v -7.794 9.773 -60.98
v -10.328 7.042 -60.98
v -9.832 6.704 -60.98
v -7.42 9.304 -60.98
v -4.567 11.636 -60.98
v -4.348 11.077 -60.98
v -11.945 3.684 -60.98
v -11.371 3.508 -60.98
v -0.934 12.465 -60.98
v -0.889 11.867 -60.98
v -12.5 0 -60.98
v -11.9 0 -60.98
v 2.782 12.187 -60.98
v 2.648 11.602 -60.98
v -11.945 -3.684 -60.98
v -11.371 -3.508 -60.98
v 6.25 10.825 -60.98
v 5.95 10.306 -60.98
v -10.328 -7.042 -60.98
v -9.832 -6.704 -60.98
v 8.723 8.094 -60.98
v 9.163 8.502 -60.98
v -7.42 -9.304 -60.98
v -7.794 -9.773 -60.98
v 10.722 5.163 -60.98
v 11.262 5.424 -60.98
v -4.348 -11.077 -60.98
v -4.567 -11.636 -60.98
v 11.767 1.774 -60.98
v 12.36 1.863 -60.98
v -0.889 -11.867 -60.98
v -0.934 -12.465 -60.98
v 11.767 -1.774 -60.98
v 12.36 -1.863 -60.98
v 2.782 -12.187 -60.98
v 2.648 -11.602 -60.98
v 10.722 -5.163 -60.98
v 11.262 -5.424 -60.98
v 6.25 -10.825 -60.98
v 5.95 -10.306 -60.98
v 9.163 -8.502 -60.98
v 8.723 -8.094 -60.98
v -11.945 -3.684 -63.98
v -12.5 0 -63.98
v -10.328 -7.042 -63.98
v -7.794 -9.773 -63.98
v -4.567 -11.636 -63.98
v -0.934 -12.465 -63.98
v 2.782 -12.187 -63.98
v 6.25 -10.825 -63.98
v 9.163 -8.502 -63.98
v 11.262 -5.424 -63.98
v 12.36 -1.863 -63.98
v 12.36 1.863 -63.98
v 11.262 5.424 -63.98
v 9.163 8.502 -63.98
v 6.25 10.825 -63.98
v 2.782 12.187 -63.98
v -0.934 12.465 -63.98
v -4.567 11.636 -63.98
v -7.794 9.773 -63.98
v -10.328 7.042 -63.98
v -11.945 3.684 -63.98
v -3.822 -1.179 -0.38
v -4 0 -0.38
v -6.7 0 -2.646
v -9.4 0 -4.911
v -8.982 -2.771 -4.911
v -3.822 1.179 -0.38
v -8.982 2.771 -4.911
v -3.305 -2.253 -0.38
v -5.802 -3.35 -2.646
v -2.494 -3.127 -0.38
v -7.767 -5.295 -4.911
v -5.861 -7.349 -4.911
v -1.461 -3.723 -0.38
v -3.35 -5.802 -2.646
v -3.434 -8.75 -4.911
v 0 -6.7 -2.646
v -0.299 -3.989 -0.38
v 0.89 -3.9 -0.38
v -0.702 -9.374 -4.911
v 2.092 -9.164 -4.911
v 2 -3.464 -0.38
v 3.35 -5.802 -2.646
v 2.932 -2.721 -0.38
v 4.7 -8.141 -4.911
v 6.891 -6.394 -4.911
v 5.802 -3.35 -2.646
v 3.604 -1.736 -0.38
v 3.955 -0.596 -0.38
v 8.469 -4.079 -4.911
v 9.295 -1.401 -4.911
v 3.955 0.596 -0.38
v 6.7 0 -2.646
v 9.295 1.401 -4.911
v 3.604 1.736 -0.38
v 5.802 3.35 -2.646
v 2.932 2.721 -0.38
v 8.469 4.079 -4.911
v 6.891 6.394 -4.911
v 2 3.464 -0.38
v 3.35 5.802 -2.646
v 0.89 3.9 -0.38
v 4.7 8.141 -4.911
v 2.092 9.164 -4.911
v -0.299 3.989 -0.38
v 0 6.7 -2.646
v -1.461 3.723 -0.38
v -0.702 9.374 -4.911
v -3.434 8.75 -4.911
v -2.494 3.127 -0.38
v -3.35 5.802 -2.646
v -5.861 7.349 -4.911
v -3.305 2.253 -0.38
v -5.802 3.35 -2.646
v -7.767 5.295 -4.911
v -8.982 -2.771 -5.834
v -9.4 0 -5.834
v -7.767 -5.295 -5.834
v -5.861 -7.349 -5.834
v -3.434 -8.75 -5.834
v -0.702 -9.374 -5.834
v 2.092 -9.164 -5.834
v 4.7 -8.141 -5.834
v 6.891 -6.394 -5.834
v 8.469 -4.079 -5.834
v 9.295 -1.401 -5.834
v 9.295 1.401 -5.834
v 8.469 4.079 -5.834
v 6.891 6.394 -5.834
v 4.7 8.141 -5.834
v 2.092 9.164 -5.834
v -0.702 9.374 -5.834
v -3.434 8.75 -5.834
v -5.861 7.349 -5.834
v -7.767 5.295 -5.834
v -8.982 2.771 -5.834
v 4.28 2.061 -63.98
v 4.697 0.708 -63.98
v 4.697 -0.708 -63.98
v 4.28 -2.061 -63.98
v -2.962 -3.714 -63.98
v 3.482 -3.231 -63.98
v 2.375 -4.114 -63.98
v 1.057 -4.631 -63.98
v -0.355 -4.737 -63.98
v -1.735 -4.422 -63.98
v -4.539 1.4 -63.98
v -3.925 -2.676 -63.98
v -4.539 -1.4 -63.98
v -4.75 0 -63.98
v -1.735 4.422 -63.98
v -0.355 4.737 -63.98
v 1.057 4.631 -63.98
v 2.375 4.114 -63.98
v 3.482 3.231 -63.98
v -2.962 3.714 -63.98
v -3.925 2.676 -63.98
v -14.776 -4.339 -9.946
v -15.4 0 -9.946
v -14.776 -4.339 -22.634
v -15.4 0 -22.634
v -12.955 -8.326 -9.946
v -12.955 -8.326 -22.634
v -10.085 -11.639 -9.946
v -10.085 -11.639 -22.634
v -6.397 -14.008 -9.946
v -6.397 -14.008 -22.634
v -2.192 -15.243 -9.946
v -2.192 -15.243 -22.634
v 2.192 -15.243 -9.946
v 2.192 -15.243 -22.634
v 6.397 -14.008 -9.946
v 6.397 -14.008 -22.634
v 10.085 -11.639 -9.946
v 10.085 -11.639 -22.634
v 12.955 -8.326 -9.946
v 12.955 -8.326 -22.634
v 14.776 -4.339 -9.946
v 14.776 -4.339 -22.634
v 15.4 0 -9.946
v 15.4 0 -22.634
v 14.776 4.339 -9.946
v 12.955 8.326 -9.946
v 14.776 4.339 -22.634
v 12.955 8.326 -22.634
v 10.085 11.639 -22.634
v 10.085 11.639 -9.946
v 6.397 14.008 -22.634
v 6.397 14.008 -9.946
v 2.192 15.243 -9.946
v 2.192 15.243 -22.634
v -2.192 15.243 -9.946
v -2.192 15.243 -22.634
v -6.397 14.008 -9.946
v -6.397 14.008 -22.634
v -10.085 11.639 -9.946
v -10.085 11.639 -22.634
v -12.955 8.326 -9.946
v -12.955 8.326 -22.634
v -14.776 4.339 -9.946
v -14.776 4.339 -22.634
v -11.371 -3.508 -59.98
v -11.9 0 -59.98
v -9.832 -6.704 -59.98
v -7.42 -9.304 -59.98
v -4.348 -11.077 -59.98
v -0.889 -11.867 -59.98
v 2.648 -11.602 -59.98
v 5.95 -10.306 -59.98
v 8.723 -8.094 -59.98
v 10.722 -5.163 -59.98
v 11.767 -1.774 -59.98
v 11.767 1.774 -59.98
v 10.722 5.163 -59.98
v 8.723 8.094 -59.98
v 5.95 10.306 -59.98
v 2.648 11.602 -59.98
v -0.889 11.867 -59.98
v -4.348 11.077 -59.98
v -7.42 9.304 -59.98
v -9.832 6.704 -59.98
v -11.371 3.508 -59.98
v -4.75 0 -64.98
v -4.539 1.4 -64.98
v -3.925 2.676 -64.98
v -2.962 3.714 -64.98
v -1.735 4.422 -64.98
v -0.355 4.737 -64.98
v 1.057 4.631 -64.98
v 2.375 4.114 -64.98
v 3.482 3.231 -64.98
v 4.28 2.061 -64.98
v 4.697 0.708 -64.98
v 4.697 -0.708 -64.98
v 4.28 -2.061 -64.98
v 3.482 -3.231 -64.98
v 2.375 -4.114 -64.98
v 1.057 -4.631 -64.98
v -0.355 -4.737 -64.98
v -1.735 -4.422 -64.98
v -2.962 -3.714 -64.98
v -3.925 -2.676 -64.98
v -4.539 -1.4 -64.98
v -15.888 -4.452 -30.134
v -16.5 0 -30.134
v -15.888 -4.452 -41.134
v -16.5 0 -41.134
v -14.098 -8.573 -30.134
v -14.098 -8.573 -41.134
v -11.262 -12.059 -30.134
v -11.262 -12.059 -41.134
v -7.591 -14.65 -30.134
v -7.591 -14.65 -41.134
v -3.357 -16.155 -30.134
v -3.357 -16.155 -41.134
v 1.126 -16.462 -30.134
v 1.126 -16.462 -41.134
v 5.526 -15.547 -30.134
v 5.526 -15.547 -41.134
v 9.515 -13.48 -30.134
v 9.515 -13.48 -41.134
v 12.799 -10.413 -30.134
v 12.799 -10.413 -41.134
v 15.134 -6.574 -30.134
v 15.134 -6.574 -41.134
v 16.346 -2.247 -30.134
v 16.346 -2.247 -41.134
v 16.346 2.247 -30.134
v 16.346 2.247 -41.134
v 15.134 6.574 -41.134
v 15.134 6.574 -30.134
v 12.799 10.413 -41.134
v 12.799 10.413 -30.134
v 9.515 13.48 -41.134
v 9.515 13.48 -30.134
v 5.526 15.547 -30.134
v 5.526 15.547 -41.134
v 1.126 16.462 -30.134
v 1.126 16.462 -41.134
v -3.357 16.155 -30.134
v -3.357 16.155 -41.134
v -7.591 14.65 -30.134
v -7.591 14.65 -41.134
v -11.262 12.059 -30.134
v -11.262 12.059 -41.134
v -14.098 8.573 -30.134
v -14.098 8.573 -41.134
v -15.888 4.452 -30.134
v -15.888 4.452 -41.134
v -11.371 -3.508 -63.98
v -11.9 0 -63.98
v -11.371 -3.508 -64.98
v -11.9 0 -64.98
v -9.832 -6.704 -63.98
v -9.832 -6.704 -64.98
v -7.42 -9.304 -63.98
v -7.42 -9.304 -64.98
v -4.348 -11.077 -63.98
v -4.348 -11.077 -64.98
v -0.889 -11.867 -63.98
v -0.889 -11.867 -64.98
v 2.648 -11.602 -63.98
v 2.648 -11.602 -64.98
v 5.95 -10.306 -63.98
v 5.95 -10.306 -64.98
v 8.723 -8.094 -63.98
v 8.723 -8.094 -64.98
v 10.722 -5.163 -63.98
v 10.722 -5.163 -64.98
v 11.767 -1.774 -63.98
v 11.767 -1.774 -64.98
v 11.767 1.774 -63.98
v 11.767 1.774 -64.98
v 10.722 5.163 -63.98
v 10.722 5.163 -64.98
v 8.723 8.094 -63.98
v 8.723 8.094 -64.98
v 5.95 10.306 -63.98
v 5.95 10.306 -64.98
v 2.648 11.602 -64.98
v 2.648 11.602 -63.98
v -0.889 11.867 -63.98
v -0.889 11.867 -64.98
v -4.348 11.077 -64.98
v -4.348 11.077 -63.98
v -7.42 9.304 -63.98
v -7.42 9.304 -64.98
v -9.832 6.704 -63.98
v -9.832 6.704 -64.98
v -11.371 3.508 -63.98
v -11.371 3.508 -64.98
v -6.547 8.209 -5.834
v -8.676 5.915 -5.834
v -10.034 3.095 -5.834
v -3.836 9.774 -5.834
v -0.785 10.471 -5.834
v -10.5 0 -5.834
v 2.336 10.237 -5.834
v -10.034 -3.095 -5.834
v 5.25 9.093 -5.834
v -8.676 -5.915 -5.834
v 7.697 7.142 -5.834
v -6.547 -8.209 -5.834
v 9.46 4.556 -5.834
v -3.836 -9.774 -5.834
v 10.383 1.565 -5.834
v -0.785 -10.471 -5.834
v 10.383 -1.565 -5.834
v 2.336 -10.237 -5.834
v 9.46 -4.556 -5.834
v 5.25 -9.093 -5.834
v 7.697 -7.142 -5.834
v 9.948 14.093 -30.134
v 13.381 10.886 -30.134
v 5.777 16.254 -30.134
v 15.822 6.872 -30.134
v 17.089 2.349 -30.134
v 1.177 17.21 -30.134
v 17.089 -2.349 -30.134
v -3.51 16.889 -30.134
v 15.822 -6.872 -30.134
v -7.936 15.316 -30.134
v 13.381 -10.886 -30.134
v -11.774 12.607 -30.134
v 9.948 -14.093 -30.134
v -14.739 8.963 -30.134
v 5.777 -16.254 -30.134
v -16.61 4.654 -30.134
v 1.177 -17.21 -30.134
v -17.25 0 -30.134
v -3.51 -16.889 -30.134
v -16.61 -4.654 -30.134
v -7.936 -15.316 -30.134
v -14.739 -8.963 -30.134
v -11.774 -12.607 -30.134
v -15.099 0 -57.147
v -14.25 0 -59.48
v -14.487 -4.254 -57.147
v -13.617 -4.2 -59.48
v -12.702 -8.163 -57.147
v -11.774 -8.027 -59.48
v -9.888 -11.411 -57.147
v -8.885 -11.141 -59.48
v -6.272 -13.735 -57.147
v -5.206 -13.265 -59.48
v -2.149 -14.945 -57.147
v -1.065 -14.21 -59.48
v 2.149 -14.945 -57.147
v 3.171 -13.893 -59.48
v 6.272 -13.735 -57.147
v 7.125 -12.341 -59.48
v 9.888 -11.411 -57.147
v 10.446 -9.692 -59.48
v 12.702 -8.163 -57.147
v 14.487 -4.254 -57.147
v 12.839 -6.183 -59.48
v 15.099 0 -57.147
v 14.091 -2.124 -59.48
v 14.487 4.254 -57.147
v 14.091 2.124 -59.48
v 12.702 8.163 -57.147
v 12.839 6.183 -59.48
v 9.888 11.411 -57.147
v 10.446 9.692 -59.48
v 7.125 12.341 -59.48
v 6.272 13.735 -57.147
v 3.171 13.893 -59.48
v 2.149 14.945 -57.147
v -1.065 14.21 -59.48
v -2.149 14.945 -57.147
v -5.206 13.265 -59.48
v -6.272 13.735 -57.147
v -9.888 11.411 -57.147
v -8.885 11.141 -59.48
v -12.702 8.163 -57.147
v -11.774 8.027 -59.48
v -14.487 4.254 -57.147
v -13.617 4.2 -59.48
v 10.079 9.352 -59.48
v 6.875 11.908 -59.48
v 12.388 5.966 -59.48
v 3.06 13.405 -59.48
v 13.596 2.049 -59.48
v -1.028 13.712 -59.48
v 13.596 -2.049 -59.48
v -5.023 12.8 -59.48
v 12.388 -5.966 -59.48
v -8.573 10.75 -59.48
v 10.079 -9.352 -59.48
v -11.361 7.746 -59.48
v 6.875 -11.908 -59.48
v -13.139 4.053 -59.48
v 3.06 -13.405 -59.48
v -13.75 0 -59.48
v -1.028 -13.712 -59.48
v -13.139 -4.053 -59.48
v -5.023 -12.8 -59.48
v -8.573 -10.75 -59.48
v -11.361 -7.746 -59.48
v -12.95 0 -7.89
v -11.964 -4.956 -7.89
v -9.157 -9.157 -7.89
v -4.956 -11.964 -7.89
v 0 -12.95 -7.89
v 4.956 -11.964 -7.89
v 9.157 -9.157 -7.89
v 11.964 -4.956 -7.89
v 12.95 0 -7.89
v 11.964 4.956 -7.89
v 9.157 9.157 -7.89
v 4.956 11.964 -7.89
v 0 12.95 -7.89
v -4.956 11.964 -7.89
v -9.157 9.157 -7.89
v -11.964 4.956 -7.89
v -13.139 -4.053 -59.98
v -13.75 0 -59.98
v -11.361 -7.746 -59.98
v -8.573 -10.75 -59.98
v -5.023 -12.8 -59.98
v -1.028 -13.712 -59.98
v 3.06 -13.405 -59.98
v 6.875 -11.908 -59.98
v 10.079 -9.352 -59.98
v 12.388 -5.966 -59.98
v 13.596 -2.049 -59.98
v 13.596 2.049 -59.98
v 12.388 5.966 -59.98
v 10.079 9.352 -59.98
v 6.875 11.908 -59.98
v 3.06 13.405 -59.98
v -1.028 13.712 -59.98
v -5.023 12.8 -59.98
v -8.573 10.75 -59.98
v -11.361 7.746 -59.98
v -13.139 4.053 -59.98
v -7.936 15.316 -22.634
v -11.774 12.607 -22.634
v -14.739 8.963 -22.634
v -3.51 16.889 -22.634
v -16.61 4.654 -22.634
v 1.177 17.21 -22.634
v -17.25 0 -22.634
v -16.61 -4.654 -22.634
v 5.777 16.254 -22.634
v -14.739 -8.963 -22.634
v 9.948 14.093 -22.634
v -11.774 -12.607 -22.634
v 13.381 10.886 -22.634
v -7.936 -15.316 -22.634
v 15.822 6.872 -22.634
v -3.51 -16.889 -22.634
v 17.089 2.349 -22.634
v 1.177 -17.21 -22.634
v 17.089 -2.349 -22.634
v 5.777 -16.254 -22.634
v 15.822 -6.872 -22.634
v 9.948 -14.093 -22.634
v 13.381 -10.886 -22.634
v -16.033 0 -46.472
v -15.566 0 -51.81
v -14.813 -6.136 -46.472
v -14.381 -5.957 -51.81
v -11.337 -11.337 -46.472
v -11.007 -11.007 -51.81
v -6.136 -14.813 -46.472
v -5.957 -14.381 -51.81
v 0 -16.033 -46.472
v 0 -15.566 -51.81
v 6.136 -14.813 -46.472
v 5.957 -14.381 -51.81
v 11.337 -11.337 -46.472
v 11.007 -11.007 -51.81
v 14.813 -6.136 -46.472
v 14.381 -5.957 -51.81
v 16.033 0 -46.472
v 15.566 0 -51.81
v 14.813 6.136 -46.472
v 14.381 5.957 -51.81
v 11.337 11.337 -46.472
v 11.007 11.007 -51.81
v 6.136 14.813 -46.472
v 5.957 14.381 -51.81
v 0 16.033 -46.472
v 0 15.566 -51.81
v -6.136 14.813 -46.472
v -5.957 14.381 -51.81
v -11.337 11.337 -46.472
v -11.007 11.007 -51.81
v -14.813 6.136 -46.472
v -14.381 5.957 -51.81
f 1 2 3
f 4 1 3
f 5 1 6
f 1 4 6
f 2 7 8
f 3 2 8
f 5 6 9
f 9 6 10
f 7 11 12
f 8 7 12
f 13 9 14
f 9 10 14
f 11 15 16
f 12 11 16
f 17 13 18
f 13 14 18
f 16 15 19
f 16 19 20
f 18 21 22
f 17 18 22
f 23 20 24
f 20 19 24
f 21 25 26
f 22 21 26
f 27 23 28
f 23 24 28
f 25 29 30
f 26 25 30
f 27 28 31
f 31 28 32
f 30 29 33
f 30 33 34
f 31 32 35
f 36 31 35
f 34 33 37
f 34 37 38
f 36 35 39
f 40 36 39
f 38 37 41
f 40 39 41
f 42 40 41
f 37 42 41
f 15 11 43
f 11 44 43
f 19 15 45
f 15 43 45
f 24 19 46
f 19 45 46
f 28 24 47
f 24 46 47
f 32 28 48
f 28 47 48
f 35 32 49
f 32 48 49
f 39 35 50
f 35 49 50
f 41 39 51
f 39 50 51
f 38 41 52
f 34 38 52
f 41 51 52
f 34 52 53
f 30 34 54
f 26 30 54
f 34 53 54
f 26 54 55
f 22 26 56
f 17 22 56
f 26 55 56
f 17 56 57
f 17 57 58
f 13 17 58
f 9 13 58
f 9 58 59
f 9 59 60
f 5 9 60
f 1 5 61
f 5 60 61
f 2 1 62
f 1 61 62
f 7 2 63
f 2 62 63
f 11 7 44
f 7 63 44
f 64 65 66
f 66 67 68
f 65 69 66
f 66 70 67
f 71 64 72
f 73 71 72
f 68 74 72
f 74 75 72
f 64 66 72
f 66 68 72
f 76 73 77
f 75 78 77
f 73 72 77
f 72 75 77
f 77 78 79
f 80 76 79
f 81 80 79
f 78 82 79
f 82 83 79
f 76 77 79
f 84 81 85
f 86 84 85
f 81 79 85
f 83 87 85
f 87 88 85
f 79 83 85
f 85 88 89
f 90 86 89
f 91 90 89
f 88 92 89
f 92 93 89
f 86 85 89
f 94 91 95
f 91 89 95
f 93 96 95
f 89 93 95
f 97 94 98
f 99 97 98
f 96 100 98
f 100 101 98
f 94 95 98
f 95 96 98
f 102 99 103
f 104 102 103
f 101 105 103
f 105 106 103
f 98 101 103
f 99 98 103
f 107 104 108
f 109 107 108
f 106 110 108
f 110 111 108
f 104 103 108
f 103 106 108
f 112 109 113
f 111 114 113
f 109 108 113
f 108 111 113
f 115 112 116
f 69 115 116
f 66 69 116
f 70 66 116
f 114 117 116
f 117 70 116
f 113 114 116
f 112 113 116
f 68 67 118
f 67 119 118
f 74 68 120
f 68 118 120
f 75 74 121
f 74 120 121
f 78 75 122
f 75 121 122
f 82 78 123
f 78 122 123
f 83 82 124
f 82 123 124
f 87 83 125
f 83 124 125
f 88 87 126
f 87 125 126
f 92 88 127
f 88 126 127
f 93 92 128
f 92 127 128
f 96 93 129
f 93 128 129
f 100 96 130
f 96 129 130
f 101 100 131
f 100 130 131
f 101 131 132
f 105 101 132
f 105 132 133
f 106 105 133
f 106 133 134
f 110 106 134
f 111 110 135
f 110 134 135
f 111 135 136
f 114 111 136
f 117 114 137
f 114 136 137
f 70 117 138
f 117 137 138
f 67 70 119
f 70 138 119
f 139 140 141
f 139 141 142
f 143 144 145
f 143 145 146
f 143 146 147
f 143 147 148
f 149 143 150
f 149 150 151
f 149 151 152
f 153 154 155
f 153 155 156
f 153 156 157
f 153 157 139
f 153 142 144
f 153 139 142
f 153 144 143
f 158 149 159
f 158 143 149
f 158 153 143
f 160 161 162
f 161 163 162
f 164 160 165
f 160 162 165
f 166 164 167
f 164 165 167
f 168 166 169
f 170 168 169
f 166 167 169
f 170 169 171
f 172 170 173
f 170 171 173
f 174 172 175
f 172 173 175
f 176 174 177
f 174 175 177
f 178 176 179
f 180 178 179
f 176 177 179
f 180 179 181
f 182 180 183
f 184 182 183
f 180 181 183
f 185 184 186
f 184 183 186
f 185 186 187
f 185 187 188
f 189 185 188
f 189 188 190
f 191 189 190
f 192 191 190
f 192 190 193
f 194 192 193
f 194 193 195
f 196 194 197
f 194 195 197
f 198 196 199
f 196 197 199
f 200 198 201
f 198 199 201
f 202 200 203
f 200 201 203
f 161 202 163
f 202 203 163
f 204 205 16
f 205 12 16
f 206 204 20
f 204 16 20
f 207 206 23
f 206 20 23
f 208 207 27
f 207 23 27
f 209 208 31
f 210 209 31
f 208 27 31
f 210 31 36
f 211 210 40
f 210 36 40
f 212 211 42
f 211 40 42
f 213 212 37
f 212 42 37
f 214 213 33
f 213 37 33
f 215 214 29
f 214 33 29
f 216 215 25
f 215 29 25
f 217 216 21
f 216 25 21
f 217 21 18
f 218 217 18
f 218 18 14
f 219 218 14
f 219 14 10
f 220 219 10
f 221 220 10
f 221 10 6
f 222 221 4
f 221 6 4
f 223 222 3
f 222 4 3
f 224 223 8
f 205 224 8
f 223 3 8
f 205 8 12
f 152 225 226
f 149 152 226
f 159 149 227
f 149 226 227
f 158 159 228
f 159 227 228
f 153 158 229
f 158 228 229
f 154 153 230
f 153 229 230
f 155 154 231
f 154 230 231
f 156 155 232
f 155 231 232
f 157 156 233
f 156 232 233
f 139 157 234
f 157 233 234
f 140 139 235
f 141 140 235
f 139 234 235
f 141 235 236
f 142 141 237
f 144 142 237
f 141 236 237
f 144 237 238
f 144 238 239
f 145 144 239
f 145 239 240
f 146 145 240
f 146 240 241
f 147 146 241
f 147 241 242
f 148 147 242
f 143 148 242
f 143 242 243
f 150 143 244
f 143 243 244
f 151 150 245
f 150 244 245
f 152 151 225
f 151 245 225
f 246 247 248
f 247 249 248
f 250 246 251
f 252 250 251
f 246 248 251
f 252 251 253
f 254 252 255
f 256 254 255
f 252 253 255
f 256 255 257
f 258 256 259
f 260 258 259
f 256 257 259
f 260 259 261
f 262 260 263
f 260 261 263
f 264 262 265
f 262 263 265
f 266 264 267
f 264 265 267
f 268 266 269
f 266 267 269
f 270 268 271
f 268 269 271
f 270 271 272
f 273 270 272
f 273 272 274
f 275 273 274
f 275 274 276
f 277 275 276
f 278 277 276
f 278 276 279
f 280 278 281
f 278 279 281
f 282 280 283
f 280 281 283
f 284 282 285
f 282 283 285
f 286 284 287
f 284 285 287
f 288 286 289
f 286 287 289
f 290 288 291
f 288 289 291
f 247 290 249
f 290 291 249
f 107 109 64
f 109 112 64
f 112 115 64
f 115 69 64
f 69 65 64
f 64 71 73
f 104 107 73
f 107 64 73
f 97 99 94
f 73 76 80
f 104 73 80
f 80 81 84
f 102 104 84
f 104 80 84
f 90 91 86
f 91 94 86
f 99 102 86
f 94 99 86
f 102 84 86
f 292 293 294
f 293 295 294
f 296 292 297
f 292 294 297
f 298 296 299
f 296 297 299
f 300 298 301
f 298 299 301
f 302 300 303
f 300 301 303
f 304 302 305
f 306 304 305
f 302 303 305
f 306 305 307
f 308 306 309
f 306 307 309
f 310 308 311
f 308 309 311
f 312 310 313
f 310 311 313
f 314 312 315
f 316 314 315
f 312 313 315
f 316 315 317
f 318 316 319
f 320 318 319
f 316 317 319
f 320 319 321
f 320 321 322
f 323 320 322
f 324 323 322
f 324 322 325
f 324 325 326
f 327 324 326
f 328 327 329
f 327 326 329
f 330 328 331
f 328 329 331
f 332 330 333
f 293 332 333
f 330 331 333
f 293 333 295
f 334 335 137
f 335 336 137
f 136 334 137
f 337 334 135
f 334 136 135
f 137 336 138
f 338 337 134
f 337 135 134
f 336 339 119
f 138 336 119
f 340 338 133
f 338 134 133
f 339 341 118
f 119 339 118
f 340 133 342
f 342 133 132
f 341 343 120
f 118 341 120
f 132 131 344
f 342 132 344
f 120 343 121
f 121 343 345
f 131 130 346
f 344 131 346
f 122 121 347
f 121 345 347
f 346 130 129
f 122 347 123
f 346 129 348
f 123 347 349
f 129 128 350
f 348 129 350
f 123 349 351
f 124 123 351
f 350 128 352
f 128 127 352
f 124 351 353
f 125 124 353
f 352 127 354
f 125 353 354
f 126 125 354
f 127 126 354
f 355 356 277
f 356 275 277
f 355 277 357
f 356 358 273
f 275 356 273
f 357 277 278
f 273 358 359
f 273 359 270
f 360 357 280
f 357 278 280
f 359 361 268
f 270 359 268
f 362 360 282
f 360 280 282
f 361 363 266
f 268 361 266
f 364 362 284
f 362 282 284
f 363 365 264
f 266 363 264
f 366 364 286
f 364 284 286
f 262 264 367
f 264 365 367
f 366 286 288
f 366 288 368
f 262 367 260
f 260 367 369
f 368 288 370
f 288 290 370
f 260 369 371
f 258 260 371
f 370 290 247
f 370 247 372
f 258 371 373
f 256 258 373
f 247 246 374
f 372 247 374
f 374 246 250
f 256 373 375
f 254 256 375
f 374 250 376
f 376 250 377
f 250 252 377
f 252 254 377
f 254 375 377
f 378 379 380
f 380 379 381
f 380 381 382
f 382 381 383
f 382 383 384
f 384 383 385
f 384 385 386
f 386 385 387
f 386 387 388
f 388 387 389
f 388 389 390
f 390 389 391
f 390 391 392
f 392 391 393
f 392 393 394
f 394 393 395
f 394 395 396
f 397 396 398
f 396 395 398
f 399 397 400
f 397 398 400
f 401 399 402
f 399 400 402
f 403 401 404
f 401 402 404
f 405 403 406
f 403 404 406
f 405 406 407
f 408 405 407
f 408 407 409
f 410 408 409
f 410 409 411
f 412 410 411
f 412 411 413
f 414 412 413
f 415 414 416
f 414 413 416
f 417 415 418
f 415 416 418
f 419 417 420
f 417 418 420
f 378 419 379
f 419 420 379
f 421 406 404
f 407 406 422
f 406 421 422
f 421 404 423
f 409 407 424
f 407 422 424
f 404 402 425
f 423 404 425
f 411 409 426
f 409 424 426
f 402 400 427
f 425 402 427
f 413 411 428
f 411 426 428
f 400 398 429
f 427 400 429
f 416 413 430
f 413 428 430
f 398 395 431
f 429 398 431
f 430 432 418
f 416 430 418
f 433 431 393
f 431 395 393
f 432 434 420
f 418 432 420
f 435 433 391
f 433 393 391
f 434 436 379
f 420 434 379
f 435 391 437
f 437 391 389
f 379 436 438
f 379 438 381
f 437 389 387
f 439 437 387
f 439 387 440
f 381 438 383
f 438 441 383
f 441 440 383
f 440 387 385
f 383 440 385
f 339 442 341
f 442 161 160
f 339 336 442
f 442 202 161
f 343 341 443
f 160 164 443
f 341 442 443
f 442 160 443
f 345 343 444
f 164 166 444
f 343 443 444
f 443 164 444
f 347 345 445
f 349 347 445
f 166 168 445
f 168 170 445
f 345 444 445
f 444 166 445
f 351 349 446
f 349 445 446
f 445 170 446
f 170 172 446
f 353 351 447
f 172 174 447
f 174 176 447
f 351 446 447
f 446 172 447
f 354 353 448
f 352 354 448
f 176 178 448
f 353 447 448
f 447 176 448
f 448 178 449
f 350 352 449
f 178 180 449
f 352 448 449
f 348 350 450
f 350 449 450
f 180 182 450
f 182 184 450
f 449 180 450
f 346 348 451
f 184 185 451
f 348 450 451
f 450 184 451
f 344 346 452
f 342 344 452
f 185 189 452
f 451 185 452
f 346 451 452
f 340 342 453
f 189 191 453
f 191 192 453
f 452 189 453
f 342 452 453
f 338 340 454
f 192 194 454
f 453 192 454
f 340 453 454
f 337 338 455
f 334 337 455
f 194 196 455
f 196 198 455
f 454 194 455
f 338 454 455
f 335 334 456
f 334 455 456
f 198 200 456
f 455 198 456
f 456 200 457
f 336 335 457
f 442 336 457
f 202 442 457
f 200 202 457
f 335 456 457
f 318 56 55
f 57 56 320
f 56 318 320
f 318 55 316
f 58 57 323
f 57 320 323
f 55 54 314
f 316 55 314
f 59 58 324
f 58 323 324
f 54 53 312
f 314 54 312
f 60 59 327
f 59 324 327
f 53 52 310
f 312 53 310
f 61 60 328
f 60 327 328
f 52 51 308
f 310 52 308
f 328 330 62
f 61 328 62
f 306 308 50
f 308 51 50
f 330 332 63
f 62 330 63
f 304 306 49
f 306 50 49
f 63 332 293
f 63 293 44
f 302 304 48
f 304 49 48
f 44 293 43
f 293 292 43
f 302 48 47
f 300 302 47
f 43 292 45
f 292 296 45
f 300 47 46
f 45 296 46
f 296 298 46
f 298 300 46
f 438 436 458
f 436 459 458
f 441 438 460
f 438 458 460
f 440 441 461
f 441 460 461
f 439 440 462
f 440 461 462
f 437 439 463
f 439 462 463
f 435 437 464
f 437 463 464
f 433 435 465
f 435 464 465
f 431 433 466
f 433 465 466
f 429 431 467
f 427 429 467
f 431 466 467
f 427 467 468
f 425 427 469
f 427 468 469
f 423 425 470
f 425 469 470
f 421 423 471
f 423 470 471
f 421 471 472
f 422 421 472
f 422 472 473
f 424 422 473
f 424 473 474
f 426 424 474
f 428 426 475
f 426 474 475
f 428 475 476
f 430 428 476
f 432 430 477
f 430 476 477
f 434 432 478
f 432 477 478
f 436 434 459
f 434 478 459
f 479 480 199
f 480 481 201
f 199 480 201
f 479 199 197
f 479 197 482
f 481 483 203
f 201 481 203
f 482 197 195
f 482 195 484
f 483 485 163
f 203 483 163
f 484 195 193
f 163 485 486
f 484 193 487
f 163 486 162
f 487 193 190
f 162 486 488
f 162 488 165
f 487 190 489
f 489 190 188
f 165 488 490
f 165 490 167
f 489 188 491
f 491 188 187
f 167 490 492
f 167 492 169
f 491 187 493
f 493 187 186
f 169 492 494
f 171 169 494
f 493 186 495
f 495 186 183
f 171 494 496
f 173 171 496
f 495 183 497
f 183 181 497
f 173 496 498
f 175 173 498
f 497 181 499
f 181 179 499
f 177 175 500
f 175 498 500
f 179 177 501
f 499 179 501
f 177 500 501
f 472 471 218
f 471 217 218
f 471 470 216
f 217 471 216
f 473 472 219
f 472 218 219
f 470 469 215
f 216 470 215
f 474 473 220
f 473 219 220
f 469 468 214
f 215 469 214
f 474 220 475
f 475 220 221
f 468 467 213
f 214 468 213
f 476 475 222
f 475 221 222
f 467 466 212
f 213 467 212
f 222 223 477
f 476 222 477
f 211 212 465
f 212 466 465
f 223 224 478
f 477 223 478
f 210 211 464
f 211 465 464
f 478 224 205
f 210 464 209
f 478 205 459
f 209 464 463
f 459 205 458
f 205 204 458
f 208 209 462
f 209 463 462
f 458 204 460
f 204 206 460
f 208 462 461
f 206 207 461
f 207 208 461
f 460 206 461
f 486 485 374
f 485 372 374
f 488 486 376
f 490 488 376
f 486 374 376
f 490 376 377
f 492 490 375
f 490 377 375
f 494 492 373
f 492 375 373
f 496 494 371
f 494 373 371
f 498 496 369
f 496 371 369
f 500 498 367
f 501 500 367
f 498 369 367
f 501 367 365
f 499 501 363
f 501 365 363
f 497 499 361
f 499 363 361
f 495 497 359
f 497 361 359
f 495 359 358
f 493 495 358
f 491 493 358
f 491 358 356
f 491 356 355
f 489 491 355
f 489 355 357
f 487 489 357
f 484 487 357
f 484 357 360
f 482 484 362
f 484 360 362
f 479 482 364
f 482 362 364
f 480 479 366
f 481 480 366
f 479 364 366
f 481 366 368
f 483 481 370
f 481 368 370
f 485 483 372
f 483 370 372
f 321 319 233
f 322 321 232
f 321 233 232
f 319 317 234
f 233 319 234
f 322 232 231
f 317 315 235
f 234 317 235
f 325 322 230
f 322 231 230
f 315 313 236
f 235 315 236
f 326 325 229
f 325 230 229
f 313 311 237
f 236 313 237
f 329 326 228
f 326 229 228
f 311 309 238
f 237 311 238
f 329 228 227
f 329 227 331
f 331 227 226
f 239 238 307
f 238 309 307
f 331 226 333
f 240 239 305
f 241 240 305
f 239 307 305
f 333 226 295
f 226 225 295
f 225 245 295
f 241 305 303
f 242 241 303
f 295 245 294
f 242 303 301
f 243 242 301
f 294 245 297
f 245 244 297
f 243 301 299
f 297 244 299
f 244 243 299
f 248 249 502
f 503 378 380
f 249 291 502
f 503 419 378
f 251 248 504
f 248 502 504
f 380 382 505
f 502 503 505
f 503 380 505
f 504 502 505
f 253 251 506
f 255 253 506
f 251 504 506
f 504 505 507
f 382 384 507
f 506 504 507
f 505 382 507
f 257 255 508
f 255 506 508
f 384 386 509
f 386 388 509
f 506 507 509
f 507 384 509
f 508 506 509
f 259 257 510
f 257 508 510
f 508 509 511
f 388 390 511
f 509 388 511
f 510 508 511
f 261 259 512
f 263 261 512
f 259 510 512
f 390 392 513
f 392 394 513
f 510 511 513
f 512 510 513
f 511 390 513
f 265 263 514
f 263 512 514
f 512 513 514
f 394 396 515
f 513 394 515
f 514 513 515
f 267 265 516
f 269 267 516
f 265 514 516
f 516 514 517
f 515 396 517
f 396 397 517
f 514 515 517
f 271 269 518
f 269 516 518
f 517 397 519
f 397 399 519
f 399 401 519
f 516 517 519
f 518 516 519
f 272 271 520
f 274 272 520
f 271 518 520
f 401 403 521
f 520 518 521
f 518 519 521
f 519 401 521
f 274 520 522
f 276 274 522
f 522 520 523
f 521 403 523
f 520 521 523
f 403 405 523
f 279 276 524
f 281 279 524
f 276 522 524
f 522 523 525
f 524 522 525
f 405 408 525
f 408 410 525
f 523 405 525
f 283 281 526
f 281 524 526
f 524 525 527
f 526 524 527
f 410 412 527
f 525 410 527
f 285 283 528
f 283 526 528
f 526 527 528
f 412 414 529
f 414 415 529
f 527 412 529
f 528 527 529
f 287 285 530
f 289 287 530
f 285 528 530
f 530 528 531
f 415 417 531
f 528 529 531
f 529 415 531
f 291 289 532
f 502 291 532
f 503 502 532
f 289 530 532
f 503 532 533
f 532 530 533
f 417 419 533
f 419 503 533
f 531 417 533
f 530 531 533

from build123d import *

# Parameters (mm, degrees)
SKETCH2_R          = 4.75
CUT_EXTRUDE1_DEPTH = 1


with BuildPart() as part:
    # Sketch1 → Revolve1 (revolve)
    with BuildSketch(Plane(origin=(0, 0, 0), x_dir=(1, 0, 0), z_dir=(0, 1, 0)), mode=Mode.PRIVATE) as revolve1_sk:
        Polygon((0, 0.38), (4, 0.38), (9.4, 4.911138008), (9.4, 5.834147603), (10.5, 5.834147603), (15.4, 9.945735795), (15.4, 22.634147603), (17.25, 22.634147603), (17.25, 30.134147603), (16.5, 30.134147603), (16.5, 41.134147603), (15.099029854, 57.147309648), (14.25, 59.48), (13.75, 59.48), (13.75, 59.98), (11.9, 59.98), (11.9, 60.98), (12.5, 60.98), (12.5, 63.98), (11.9, 63.98), (11.9, 64.98), (0, 64.98), align=None)
    revolve(revolve1_sk.sketch.rotate(Axis((0, 0, -64.98), (0, 0, 1)), 180), axis=Axis((0, 0, -64.98), (0, 0, 1)))

    # Sketch2 → Cut-Extrude1 (cut)
    with BuildSketch(Plane(origin=(0, 0, -64.98), x_dir=(-1, 0, 0), z_dir=(0, 0, -1))):
        Circle(SKETCH2_R)
    extrude(amount=-CUT_EXTRUDE1_DEPTH, mode=Mode.SUBTRACT)


solid = part.part
